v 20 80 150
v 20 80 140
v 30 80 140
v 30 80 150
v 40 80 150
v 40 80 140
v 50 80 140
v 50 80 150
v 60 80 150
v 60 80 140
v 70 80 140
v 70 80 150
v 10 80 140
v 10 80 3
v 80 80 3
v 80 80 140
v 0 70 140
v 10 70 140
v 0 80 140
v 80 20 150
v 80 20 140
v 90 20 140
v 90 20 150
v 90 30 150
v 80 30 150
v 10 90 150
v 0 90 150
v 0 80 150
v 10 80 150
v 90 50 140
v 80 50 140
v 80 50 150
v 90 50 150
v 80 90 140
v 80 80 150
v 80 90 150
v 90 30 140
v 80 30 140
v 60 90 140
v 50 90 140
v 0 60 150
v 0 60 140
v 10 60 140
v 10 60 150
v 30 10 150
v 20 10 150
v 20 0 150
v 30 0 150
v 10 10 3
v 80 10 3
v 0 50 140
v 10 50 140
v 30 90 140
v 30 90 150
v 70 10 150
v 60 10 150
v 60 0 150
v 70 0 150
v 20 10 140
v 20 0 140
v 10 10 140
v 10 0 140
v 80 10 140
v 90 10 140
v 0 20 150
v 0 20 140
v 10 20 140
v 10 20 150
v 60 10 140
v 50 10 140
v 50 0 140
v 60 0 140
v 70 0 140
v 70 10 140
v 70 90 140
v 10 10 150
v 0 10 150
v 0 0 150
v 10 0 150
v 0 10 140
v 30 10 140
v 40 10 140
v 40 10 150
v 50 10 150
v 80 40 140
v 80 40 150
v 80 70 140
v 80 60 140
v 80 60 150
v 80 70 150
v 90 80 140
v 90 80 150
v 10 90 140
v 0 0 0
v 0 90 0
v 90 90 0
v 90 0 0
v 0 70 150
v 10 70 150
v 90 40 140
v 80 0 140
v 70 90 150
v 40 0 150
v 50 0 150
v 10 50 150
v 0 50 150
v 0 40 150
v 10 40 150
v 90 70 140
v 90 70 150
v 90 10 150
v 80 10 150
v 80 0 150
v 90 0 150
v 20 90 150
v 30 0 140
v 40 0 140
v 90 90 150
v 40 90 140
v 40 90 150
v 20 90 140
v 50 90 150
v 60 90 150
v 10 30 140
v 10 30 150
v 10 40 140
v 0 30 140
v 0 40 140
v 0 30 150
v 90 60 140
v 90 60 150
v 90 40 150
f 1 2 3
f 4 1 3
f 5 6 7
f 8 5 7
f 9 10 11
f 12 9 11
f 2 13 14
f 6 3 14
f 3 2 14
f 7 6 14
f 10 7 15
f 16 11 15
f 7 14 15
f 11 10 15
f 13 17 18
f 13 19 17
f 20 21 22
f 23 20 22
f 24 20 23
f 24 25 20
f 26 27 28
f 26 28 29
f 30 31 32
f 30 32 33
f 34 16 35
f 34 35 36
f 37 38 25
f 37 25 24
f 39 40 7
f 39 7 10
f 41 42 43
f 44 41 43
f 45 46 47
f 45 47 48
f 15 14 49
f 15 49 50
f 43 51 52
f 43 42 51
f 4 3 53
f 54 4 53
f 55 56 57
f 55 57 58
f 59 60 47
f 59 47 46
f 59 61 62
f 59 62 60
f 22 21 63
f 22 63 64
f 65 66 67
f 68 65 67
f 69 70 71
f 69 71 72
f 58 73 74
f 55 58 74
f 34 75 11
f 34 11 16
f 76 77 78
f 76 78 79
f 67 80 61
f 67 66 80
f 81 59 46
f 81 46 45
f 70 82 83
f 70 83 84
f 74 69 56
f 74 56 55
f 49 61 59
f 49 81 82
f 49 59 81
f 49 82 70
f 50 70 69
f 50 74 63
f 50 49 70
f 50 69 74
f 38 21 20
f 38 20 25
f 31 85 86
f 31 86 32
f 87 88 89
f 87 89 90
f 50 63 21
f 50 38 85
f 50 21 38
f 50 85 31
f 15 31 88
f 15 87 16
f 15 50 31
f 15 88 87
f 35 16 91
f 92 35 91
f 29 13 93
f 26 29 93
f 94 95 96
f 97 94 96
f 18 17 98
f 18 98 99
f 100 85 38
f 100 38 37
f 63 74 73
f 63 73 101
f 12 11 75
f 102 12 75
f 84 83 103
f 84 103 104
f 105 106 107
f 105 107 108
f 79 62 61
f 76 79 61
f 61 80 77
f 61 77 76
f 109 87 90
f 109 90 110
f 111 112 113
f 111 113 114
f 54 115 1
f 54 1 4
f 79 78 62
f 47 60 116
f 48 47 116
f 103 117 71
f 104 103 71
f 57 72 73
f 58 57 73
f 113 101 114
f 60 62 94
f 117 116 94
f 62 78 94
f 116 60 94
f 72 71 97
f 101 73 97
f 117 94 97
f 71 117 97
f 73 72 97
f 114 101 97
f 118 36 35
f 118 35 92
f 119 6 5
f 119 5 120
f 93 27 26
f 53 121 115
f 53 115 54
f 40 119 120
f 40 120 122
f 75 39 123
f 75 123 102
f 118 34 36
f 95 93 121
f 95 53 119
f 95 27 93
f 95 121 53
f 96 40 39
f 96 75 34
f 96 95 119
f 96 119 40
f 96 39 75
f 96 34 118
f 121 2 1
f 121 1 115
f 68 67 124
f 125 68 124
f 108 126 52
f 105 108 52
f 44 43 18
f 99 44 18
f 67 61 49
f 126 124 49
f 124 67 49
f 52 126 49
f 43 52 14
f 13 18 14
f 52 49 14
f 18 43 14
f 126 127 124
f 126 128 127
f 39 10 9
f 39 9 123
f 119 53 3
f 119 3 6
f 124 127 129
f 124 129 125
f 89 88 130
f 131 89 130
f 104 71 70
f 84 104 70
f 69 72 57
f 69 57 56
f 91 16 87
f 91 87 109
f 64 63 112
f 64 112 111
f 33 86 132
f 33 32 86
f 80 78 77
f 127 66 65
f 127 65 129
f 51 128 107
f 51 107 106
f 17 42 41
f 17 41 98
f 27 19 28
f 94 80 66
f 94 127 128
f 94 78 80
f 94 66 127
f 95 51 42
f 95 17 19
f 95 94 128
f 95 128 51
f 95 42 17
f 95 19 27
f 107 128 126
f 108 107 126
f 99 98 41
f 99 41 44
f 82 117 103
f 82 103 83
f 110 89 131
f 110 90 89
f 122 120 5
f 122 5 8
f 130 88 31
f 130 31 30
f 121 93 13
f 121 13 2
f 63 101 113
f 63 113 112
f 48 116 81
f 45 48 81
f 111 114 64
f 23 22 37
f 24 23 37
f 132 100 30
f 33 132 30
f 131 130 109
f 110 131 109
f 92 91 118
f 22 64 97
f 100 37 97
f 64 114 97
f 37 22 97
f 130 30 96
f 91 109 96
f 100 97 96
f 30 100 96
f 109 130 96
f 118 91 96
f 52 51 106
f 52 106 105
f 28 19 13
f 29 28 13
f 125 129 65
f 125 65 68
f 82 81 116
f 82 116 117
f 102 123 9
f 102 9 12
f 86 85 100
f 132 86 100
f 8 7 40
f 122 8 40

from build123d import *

# Parameters (mm, degrees)
BOX003_W      = 70
BOX003_H      = 70
BOX003_DEPTH  = 150
BOX001_W      = 10
BOX001_H      = 10
BOX001_DEPTH  = 14
ARRAY_X_COUNT = 5
ARRAY_X_PITCH = 20
ARRAY_Y_COUNT = 5
ARRAY_Y_PITCH = 20
BOX002_W      = 110
BOX002_H      = 110
BOX002_DEPTH  = 10
BOX_W         = 90
BOX_H         = 90
BOX_DEPTH     = 150


with BuildPart() as cube003:
    # Box003 → Box003 (new body)
    with BuildSketch(Plane(origin=(10, 10, 3), x_dir=(1, 0, 0), z_dir=(0, 0, 1))):
        with Locations((35, 35)):
            Rectangle(BOX003_W, BOX003_H)
    extrude(amount=BOX003_DEPTH)


with BuildPart() as array:
    # Box001 → Box001 (new body)
    with BuildSketch(Plane.XY):
        with Locations((5, 5)):
            Rectangle(BOX001_W, BOX001_H)
    extrude(amount=BOX001_DEPTH)

    # Array X: Array ×5


with BuildPart() as array_1:
    add(array.part)
    with Locations(*[(i * ARRAY_X_PITCH, 0, 0) for i in range(1, ARRAY_X_COUNT)]):
        add(array.part)

    # Array Y: Array ×5


with BuildPart() as array_2:
    add(array_1.part)
    with Locations(*[(0, i * ARRAY_Y_PITCH, 0) for i in range(1, ARRAY_Y_COUNT)]):
        add(array_1.part)


with BuildPart() as cut:
    # Box002 → Box002 (new body)
    with BuildSketch(Plane(origin=(-10, -9, 0), x_dir=(1, 0, 0), z_dir=(0, 0, 1))):
        with Locations((55, 55)):
            Rectangle(BOX002_W, BOX002_H)
    extrude(amount=BOX002_DEPTH)

    # Cut: cut Array
    add(array_2.part, mode=Mode.SUBTRACT)


with BuildPart() as cut_1:
    # Cut placement: moved
    add(cut.part.moved(Location((0, 0, 140))))


with BuildPart() as cut002:
    # Box → Box (new body)
    with BuildSketch(Plane.XY):
        with Locations((45, 45)):
            Rectangle(BOX_W, BOX_H)
    extrude(amount=BOX_DEPTH)

    # Cut001: cut Cut
    add(cut_1.part, mode=Mode.SUBTRACT)

    # Cut002: cut Cube003
    add(cube003.part, mode=Mode.SUBTRACT)


solid = cut002.part
